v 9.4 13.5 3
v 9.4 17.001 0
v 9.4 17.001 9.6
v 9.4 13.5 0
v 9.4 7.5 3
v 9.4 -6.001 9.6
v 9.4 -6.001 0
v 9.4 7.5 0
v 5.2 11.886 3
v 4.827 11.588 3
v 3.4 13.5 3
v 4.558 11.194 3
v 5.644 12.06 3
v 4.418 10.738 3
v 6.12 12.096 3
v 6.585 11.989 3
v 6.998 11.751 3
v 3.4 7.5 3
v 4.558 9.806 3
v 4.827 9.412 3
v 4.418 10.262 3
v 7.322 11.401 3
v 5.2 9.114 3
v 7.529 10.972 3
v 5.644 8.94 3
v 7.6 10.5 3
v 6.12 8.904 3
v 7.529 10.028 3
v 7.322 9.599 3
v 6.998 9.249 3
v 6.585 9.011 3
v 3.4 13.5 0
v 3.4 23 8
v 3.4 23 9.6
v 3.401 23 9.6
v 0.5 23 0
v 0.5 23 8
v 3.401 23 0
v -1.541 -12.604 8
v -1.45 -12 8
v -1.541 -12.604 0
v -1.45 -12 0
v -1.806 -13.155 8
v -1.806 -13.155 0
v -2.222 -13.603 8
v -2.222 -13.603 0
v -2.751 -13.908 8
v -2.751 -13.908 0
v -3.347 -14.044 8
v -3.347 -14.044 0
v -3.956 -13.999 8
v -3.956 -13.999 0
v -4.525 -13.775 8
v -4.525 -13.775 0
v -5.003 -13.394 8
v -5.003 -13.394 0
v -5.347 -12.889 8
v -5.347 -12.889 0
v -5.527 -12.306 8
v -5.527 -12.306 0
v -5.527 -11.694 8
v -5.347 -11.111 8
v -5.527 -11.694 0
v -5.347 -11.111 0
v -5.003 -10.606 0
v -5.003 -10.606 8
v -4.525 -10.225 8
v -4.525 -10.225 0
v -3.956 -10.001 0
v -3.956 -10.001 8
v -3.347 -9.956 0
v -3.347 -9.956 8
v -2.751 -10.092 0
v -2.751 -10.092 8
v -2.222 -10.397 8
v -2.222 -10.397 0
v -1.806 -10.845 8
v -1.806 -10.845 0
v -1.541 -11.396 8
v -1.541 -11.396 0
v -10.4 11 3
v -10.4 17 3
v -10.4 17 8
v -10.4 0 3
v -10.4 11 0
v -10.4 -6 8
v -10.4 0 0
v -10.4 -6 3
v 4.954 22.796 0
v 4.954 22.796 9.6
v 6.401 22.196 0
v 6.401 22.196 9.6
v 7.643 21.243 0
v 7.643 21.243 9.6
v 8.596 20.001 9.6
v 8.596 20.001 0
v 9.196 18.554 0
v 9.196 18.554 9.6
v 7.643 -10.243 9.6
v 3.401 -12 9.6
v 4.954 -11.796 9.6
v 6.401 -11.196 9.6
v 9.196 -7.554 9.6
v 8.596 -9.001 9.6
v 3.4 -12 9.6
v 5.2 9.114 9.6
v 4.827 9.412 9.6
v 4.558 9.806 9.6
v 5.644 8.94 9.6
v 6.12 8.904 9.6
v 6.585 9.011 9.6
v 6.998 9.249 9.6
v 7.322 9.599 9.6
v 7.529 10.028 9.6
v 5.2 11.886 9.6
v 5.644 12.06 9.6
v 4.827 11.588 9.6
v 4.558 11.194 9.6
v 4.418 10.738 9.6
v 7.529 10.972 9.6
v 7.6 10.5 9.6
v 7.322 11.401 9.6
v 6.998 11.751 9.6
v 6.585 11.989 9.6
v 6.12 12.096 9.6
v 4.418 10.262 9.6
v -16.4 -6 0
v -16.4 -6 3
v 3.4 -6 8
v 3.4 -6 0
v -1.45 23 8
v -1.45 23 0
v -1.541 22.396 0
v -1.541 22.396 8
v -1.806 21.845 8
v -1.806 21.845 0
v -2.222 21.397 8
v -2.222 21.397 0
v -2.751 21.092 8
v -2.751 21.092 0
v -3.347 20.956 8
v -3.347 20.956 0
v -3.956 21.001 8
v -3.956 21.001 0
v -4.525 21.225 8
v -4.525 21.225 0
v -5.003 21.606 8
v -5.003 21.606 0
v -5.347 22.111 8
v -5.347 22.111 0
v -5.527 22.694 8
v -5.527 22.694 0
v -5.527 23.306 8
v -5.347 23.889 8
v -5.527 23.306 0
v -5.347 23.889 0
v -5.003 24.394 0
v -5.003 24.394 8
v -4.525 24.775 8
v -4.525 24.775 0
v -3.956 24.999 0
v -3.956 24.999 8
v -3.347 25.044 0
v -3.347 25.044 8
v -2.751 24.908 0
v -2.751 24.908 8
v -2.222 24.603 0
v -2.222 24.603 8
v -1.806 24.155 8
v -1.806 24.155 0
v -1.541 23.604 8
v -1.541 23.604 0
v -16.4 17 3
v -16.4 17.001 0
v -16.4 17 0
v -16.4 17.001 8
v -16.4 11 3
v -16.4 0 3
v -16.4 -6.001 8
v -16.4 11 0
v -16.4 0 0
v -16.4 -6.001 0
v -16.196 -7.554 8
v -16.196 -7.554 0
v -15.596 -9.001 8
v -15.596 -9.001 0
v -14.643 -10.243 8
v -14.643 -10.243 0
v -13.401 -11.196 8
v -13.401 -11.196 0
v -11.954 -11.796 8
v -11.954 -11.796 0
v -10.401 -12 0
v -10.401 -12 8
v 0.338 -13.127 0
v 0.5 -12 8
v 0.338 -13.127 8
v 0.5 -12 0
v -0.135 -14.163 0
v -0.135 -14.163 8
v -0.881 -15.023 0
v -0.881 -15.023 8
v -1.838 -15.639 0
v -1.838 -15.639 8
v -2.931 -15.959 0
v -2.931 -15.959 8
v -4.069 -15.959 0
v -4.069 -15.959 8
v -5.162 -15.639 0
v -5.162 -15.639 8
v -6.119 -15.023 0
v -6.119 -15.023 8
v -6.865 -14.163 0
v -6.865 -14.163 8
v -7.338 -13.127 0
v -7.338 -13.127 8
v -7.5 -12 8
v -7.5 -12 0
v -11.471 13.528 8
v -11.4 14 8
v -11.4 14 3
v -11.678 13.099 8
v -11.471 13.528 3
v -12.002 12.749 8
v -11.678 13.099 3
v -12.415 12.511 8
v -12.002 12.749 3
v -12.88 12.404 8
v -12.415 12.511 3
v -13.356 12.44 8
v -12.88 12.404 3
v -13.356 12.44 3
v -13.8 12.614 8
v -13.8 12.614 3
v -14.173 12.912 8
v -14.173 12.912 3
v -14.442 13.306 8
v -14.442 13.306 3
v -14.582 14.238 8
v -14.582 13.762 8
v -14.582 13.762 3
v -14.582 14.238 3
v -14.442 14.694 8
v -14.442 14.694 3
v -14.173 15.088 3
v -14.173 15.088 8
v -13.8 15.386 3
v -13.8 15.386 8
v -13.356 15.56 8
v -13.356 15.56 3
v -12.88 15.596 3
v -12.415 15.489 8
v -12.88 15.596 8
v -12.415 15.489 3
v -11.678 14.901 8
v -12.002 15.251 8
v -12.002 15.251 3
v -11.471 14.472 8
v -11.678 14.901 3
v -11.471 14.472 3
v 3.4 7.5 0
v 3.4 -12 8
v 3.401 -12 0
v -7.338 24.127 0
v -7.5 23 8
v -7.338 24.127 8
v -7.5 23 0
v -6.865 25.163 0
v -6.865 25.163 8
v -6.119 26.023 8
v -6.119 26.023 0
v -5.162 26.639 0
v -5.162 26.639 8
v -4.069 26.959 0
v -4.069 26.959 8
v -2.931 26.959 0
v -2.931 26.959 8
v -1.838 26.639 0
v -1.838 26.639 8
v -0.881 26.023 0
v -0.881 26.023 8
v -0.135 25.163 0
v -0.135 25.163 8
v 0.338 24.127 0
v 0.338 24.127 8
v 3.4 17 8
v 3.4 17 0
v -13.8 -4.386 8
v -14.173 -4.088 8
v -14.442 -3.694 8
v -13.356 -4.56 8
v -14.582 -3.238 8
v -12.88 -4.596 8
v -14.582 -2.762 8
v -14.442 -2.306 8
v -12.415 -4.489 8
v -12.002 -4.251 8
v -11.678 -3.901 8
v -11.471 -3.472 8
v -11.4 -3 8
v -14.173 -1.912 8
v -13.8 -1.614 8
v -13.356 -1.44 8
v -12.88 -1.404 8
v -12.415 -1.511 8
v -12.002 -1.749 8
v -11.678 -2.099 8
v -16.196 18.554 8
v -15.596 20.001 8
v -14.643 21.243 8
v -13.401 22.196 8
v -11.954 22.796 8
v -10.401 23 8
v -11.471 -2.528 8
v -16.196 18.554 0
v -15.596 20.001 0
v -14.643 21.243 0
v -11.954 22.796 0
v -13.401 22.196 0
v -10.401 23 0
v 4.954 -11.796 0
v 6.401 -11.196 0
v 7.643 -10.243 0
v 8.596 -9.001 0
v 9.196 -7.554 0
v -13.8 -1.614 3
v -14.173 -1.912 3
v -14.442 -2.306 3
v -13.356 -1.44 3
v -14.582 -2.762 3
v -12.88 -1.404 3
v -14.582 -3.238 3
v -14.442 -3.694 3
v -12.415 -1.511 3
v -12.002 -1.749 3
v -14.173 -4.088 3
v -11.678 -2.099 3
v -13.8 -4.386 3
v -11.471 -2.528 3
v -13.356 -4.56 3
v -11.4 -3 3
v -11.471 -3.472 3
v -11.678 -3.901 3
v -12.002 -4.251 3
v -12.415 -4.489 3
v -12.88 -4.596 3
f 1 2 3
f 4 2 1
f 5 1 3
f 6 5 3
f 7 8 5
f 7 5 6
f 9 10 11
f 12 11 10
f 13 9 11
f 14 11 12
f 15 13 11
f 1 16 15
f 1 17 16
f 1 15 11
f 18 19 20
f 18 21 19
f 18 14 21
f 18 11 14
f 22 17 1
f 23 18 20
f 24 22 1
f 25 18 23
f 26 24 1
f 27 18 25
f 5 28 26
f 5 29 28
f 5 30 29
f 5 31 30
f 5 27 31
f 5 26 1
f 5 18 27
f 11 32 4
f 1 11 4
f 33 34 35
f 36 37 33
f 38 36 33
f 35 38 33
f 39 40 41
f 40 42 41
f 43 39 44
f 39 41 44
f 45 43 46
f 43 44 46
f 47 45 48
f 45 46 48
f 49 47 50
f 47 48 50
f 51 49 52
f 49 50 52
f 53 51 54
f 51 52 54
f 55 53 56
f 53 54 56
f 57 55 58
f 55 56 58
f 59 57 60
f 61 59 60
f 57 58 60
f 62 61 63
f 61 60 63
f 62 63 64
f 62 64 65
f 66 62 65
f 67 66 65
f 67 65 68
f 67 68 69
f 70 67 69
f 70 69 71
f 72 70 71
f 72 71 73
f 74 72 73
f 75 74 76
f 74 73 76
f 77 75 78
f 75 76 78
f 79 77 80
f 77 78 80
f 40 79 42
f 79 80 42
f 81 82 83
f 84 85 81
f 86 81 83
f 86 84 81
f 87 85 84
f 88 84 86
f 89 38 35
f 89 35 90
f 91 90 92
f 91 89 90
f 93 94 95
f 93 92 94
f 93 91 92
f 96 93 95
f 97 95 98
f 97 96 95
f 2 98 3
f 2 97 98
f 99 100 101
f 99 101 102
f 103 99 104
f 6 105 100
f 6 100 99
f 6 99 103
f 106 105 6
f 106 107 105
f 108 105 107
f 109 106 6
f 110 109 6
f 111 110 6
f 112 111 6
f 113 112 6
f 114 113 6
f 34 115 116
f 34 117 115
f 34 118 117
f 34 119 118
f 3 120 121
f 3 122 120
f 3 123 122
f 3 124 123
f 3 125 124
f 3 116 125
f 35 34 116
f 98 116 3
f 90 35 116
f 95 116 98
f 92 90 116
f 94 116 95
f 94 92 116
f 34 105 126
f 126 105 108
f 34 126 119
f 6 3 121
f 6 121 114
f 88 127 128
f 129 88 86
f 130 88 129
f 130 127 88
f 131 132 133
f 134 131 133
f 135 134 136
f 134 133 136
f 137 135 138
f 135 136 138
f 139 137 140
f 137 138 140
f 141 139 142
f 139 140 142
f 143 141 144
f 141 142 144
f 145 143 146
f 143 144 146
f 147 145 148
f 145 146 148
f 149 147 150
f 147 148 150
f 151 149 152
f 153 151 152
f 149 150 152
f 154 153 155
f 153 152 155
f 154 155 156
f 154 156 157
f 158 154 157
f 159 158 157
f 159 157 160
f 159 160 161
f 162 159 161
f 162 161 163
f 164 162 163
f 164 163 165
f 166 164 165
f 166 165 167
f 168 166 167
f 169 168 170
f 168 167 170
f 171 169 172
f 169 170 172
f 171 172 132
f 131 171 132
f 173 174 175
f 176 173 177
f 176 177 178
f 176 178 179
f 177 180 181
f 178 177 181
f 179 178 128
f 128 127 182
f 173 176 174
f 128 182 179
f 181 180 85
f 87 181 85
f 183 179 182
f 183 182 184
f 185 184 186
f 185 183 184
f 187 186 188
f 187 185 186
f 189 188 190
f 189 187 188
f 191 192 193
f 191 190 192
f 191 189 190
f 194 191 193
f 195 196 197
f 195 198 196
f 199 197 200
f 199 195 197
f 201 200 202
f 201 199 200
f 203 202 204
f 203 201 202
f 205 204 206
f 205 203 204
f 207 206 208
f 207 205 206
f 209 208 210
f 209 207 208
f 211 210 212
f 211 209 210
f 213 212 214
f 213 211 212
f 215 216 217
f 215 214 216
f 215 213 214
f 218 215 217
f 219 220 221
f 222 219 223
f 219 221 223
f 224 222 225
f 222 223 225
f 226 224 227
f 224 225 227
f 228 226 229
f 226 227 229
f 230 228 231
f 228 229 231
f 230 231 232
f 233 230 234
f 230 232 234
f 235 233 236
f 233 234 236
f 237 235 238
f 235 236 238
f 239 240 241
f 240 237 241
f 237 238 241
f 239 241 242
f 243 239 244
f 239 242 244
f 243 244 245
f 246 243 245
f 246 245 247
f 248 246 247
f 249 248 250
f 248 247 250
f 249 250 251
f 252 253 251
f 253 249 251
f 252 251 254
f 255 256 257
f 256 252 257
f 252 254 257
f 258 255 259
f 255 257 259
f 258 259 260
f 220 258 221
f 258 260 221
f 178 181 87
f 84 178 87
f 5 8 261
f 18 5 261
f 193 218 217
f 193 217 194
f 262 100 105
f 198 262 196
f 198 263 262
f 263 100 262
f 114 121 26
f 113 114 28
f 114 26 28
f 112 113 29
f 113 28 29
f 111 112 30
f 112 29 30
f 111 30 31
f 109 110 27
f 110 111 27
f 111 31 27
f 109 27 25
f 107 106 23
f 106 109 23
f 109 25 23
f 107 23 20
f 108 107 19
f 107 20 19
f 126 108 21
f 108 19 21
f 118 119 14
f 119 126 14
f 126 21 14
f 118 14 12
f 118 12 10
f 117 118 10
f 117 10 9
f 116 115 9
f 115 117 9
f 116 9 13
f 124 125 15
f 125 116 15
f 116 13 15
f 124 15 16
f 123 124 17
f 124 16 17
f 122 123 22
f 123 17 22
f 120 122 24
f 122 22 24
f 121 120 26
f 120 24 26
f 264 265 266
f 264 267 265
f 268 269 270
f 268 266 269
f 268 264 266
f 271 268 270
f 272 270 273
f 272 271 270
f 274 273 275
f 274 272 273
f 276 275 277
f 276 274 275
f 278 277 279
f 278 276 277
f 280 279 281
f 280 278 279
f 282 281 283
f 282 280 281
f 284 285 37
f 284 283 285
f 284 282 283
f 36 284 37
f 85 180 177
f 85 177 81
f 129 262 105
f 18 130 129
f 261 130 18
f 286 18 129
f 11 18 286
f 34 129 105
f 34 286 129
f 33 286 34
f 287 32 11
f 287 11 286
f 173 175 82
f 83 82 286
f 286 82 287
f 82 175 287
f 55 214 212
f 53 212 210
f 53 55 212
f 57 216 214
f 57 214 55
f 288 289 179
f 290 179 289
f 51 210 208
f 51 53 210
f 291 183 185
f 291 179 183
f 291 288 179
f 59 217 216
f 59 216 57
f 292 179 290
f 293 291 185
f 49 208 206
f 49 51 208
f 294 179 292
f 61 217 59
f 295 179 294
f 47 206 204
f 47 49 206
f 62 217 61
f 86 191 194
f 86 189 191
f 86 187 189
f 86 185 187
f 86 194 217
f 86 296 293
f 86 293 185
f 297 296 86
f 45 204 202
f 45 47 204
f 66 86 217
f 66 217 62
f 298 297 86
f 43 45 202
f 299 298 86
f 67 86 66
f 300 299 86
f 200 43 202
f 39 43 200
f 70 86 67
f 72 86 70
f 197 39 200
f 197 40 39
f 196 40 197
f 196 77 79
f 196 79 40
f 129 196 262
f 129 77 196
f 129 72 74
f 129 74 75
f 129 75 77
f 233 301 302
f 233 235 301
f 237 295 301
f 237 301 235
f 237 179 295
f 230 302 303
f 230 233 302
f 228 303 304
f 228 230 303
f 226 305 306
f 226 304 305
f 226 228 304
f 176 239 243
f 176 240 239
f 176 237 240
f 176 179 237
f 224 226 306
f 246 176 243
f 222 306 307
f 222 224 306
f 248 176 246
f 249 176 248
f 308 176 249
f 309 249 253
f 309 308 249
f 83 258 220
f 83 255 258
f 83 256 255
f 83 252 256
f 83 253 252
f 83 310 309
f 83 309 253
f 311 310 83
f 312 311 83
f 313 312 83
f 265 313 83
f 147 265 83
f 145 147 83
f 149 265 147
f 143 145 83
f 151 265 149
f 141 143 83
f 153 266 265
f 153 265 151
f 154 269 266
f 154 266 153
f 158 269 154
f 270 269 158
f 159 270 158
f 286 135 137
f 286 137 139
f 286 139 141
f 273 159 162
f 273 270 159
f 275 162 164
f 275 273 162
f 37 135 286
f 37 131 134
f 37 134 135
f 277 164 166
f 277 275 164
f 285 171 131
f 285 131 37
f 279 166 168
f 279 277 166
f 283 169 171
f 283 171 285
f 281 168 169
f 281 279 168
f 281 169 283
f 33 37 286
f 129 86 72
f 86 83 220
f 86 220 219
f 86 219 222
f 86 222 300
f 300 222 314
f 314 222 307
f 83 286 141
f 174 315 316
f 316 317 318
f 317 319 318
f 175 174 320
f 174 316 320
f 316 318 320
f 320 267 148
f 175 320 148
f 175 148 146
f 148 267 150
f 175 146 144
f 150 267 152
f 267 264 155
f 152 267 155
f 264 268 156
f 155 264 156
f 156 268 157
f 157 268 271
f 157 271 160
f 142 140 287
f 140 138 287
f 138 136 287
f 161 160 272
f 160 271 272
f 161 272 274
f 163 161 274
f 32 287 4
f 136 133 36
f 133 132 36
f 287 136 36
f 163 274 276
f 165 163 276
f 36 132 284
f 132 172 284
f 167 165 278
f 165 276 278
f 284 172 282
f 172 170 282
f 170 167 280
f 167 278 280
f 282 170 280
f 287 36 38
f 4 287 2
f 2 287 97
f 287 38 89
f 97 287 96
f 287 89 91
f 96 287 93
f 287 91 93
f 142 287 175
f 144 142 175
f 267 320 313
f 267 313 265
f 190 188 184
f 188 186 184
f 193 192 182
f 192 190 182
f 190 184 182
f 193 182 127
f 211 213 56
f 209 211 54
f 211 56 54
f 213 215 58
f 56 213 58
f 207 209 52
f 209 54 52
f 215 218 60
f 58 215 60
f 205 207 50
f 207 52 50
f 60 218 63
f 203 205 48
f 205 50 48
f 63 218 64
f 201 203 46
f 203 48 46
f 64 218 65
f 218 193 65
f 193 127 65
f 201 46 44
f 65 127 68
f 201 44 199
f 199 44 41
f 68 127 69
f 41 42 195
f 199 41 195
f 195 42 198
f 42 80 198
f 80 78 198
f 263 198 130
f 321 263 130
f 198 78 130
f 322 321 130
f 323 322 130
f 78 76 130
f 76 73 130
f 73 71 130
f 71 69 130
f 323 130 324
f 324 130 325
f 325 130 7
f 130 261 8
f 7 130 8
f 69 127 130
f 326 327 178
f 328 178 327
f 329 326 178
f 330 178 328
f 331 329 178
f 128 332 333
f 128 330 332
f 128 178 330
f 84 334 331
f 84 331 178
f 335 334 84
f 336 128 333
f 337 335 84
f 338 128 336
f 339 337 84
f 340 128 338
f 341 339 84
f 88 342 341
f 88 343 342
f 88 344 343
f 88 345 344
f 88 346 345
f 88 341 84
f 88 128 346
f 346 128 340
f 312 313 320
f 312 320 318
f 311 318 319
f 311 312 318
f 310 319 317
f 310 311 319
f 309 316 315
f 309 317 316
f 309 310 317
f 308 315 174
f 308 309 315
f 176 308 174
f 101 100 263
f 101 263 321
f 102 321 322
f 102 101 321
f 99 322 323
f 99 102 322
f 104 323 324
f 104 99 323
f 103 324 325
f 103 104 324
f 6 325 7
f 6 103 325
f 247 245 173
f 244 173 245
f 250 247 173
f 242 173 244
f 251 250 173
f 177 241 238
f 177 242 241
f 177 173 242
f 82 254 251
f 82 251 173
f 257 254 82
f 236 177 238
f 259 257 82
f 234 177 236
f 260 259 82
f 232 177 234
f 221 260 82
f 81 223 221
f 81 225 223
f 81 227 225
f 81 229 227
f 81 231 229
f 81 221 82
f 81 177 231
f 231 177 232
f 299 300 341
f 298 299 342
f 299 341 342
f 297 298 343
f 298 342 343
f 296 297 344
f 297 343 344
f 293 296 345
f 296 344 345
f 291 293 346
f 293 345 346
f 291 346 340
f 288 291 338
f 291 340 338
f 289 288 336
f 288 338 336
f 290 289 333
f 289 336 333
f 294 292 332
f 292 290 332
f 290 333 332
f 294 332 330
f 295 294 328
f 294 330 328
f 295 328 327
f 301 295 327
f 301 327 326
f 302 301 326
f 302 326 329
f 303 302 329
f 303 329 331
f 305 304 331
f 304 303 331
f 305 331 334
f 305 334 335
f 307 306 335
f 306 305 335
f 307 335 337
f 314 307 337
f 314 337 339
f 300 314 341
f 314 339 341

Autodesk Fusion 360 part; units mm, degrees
sketch "Skizze1" plane through (0, 0, 0) normal (0, 0, 1) x (1, 0, 0)
  circle A0 centre (-13, 14) radius 1.6
  circle A1 centre (-13, -3) radius 1.6
  line L0 (-10.4, 17) -> (-10.4, -6)
  line L1 (-11.4, 14) -> (-10.4, 14) construction
  line L2 (-19, 17) -> (14, 17)
  line L3 (-20.3748, -6) -> (15.4156, -6)
  line L4 (-16.4, 27.5706) -> (-16.4, -12)
  line L5 (-11.401, -2.9445) -> (3.799, -2.9445) construction
  line L6 (3.4, -14.6443) -> (3.4, 27)
  line L7 (9.4, 27) -> (9.4, -17)
  line L8 (-21, 23) -> (15, 23)
  line L9 (15, -12) -> (-27, -12)
  circle A2 centre (6, 10.5) radius 1.6
  line L10 (4.4, 10.5) -> (3.4, 10.5) construction
  line L11 (-13, -3) -> (-13, 3) construction
  line L12 (-13, 3) -> (-13, -17) construction
  line L13 (9.4, -17) -> (-16.4, -17) construction
  line L14 (-13, 3) -> (-13, 23) construction
  line L15 (-16.4, 22.0964) -> (9.4, 22.0964) construction
  line L16 (-3.5, 22.0964) -> (-3.5, 23) construction
  circle A3 centre (-3.5, 23) radius 2.05
  circle A4 centre (-3.5, 23) radius 4
  circle A5 centre (-3.5, -12) radius 2.05
  circle A6 centre (-3.5, -12) radius 4
  point P0 (-3.5, -17)
  point P1 (-3.5, 22.0964)
  dimension "d1" = 3.2
  dimension "d2" = 3.2
  dimension "d3" = 17
  dimension "d4" = 1
  dimension "d5" = 3
  dimension "d6" = 3
  dimension "d7" = 6
  dimension "d8" = 15.2
  dimension "d9" = 6
  dimension "d10" = 6
  dimension "d11" = 6
  dimension "d12" = 3.2
  dimension "d13" = 3.5
  dimension "d16" = 2.6
  dimension "d21" = 6
  dimension "d22" = 20
  dimension "d24" = 25.8
  dimension "d27" = 20
  dimension "d28" = 4.1
  dimension "d29" = 8
  dimension "d40" = 4.1
  dimension "d41" = 8
extrude "Extrusion1" add sketch "Skizze1" along normal blind 8 contours L0 L2 L3 L4 | L2 L4 L6 L8 A4 | L3 L4 L6 L9 A6 | L2 L6 L7 L8 | L2 L3 L6 L7 | L3 L6 L7 L9 | L8 A3 A4 | L9 A5 A6 | L8 A3 | L9 A5 picked at (-0.1725, 22.6994) picked at (-6.7682, -11.3064) picked at (-3.4489, 22.3186) picked at (-2.9991, -11.3315)
extrude "Extrusion2" add sketch "Skizze1" along normal blind 9.6 contours L2 L6 L7 L8 | L2 L3 L6 L7 | L3 L6 L7 L9
extrude "Extrusion3" add sketch "Skizze1" along normal blind 8 contours L8 A3 A4 | L9 A5 A6 picked at (-6.8275, 23.3006) picked at (-6.8351, -12.1987)
extrude "Extrusion7" cut sketch "Skizze1" along normal blind 8 contours L8 A3 | L9 A5 picked at (-3.4489, 22.3186) picked at (-2.9991, -11.3315)
fillet "Abrundung2" radius 6 4 edges at (-16.4, -12, 4) (-16.4, 23, 4) (9.4, 23, 4.8) (9.4, -12, 4.8)
sketch "Skizze2" plane through (0, 0, 0) normal (0, 0, -1) x (1, 0, 0)
  circle A0 centre (-13, -14) radius 1.6
  circle A1 centre (-13, 3) radius 1.6
  line L0 (3.4, 6) -> (3.4, -17)
  line L1 (3.4, -17) -> (-10.4, -17)
  line L2 (-10.4, -17) -> (-10.4, 6)
  line L3 (-10.4, 6) -> (3.4, 6)
  circle A2 centre (6, -10.5) radius 1.6
  arc A3 (9.4, 6) -> (3.4, 12) centre (3.4, 6) ccw
  line L4 (3.4, 12) -> (0.5, 12)
  arc A4 (0.5, 12) -> (-7.5, 12) centre (-3.5, 12) ccw
  line L5 (-7.5, 12) -> (-10.4, 12)
  arc A5 (-10.4, 12) -> (-16.4, 6) centre (-10.4, 6) ccw
  line L6 (-16.4, 6) -> (-16.4, -17)
  arc A6 (-16.4, -17) -> (-10.4, -23) centre (-10.4, -17) ccw
  line L7 (-10.4, -23) -> (-7.5, -23)
  arc A7 (-7.5, -23) -> (0.5, -23) centre (-3.5, -23) ccw
  line L8 (0.5, -23) -> (3.4, -23)
  arc A8 (3.4, -23) -> (9.4, -17) centre (3.4, -17) ccw
  line L9 (9.4, -17) -> (9.4, 6)
  circle A9 centre (-3.5, 12) radius 2.05
  circle A10 centre (-3.5, -23) radius 2.05
  circle A11 centre (-13, 3) radius 3
  circle A12 centre (-13, -14) radius 3
  circle A13 centre (6, -10.5) radius 3
  line L10 (-10, 3) -> (-10, 6)
  line L11 (-10, -14) -> (-10, -17)
  line L12 (-13, 6) -> (-10.4, 6)
  line L13 (-13, 0) -> (-10.4, 0)
  line L14 (6, -7.5) -> (3.4, -7.5)
  line L15 (-13, -11) -> (-10.4, -11)
  line L16 (-13, -17) -> (-10.4, -17)
  line L17 (6, -13.5) -> (3.4, -13.5)
  line L18 (-13, 6) -> (-16.4, 6)
  line L19 (-13, 0) -> (-16.4, 0)
  line L20 (6, -7.5) -> (9.4, -7.5)
  line L21 (6, -13.5) -> (9.4, -13.5)
  line L22 (-13, -17) -> (-16.4, -17)
  line L23 (-13, -11) -> (-16.4, -11)
  dimension "d46" = 1.4
  dimension "d47" = 1.4
  dimension "d48" = 1.4
extrude "Extrusion8" cut sketch "Skizze2" against normal blind 3 contours L0 A13 L14 | L0 A13 | L9 A13 L20 L21 | L2 A11 L12 | L0 A13 L17 | L2 A11 | L6 A11 L18 L19 | L2 A11 L13 | L2 A12 L15 | L6 A12 L22 L23 | L2 A12 | L2 A12 L16 picked at (3.7333, -10.5) picked at (-10.7333, 3) picked at (-10.7333, -14)
